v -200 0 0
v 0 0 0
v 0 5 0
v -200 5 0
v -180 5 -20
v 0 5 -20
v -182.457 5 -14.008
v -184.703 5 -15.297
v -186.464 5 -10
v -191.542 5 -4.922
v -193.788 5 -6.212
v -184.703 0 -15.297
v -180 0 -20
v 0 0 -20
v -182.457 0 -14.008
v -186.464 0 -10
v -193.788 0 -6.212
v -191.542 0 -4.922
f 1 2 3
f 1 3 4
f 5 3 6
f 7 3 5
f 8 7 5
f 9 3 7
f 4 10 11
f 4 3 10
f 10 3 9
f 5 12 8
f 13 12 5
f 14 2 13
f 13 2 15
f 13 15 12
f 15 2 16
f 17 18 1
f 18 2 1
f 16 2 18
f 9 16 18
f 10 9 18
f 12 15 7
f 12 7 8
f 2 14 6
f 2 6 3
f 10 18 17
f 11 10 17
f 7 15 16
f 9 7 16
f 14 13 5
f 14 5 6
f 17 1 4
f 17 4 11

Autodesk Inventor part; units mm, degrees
ref_plane "YZ Plane" through (0, 0, 0) normal (1, 0, 0) x (0, 1, 0)
ref_plane "XZ Plane" through (0, 0, 0) normal (0, 1, 0) x (-1, 0, 0)
ref_plane "XY Plane" through (0, 0, 0) normal (0, 0, 1) x (1, 0, 0)
sketch "Sketch1" plane through (0, 0, 0) normal (0, 1, 0) x (-1, 0, 0)
  line L0 (0, 0) -> (200, 0)
  line L1 (200, 0) -> (200, -7.5533)
  line L2 (180, -20) -> (0, -20)
  line L3 (0, -20) -> (0, 0)
  line L4 (200, 0) -> (180, -20)
  line L5 (182.0213, -10) -> (194.6749, -10)
  line L6 (182.4568, -14.0077) -> (191.5424, -4.9221)
  line L7 (182.4568, -14.0077) -> (184.7026, -15.2974)
  line L8 (191.5424, -4.9221) -> (193.7882, -6.2118)
  point P0 (200, -10)
  dimension "d0" = 20
  dimension "d1" = 200
  dimension "d7" = 10
  dimension "d8" = 2.5
  dimension "d9" = 12.849
extrude "Extrusion1" add sketch "Sketch1" along normal blind 5 contours L0 L4 L8 L6 L7 L2 L3
properties part number "Yaxix" material "Wood (Birch)"
